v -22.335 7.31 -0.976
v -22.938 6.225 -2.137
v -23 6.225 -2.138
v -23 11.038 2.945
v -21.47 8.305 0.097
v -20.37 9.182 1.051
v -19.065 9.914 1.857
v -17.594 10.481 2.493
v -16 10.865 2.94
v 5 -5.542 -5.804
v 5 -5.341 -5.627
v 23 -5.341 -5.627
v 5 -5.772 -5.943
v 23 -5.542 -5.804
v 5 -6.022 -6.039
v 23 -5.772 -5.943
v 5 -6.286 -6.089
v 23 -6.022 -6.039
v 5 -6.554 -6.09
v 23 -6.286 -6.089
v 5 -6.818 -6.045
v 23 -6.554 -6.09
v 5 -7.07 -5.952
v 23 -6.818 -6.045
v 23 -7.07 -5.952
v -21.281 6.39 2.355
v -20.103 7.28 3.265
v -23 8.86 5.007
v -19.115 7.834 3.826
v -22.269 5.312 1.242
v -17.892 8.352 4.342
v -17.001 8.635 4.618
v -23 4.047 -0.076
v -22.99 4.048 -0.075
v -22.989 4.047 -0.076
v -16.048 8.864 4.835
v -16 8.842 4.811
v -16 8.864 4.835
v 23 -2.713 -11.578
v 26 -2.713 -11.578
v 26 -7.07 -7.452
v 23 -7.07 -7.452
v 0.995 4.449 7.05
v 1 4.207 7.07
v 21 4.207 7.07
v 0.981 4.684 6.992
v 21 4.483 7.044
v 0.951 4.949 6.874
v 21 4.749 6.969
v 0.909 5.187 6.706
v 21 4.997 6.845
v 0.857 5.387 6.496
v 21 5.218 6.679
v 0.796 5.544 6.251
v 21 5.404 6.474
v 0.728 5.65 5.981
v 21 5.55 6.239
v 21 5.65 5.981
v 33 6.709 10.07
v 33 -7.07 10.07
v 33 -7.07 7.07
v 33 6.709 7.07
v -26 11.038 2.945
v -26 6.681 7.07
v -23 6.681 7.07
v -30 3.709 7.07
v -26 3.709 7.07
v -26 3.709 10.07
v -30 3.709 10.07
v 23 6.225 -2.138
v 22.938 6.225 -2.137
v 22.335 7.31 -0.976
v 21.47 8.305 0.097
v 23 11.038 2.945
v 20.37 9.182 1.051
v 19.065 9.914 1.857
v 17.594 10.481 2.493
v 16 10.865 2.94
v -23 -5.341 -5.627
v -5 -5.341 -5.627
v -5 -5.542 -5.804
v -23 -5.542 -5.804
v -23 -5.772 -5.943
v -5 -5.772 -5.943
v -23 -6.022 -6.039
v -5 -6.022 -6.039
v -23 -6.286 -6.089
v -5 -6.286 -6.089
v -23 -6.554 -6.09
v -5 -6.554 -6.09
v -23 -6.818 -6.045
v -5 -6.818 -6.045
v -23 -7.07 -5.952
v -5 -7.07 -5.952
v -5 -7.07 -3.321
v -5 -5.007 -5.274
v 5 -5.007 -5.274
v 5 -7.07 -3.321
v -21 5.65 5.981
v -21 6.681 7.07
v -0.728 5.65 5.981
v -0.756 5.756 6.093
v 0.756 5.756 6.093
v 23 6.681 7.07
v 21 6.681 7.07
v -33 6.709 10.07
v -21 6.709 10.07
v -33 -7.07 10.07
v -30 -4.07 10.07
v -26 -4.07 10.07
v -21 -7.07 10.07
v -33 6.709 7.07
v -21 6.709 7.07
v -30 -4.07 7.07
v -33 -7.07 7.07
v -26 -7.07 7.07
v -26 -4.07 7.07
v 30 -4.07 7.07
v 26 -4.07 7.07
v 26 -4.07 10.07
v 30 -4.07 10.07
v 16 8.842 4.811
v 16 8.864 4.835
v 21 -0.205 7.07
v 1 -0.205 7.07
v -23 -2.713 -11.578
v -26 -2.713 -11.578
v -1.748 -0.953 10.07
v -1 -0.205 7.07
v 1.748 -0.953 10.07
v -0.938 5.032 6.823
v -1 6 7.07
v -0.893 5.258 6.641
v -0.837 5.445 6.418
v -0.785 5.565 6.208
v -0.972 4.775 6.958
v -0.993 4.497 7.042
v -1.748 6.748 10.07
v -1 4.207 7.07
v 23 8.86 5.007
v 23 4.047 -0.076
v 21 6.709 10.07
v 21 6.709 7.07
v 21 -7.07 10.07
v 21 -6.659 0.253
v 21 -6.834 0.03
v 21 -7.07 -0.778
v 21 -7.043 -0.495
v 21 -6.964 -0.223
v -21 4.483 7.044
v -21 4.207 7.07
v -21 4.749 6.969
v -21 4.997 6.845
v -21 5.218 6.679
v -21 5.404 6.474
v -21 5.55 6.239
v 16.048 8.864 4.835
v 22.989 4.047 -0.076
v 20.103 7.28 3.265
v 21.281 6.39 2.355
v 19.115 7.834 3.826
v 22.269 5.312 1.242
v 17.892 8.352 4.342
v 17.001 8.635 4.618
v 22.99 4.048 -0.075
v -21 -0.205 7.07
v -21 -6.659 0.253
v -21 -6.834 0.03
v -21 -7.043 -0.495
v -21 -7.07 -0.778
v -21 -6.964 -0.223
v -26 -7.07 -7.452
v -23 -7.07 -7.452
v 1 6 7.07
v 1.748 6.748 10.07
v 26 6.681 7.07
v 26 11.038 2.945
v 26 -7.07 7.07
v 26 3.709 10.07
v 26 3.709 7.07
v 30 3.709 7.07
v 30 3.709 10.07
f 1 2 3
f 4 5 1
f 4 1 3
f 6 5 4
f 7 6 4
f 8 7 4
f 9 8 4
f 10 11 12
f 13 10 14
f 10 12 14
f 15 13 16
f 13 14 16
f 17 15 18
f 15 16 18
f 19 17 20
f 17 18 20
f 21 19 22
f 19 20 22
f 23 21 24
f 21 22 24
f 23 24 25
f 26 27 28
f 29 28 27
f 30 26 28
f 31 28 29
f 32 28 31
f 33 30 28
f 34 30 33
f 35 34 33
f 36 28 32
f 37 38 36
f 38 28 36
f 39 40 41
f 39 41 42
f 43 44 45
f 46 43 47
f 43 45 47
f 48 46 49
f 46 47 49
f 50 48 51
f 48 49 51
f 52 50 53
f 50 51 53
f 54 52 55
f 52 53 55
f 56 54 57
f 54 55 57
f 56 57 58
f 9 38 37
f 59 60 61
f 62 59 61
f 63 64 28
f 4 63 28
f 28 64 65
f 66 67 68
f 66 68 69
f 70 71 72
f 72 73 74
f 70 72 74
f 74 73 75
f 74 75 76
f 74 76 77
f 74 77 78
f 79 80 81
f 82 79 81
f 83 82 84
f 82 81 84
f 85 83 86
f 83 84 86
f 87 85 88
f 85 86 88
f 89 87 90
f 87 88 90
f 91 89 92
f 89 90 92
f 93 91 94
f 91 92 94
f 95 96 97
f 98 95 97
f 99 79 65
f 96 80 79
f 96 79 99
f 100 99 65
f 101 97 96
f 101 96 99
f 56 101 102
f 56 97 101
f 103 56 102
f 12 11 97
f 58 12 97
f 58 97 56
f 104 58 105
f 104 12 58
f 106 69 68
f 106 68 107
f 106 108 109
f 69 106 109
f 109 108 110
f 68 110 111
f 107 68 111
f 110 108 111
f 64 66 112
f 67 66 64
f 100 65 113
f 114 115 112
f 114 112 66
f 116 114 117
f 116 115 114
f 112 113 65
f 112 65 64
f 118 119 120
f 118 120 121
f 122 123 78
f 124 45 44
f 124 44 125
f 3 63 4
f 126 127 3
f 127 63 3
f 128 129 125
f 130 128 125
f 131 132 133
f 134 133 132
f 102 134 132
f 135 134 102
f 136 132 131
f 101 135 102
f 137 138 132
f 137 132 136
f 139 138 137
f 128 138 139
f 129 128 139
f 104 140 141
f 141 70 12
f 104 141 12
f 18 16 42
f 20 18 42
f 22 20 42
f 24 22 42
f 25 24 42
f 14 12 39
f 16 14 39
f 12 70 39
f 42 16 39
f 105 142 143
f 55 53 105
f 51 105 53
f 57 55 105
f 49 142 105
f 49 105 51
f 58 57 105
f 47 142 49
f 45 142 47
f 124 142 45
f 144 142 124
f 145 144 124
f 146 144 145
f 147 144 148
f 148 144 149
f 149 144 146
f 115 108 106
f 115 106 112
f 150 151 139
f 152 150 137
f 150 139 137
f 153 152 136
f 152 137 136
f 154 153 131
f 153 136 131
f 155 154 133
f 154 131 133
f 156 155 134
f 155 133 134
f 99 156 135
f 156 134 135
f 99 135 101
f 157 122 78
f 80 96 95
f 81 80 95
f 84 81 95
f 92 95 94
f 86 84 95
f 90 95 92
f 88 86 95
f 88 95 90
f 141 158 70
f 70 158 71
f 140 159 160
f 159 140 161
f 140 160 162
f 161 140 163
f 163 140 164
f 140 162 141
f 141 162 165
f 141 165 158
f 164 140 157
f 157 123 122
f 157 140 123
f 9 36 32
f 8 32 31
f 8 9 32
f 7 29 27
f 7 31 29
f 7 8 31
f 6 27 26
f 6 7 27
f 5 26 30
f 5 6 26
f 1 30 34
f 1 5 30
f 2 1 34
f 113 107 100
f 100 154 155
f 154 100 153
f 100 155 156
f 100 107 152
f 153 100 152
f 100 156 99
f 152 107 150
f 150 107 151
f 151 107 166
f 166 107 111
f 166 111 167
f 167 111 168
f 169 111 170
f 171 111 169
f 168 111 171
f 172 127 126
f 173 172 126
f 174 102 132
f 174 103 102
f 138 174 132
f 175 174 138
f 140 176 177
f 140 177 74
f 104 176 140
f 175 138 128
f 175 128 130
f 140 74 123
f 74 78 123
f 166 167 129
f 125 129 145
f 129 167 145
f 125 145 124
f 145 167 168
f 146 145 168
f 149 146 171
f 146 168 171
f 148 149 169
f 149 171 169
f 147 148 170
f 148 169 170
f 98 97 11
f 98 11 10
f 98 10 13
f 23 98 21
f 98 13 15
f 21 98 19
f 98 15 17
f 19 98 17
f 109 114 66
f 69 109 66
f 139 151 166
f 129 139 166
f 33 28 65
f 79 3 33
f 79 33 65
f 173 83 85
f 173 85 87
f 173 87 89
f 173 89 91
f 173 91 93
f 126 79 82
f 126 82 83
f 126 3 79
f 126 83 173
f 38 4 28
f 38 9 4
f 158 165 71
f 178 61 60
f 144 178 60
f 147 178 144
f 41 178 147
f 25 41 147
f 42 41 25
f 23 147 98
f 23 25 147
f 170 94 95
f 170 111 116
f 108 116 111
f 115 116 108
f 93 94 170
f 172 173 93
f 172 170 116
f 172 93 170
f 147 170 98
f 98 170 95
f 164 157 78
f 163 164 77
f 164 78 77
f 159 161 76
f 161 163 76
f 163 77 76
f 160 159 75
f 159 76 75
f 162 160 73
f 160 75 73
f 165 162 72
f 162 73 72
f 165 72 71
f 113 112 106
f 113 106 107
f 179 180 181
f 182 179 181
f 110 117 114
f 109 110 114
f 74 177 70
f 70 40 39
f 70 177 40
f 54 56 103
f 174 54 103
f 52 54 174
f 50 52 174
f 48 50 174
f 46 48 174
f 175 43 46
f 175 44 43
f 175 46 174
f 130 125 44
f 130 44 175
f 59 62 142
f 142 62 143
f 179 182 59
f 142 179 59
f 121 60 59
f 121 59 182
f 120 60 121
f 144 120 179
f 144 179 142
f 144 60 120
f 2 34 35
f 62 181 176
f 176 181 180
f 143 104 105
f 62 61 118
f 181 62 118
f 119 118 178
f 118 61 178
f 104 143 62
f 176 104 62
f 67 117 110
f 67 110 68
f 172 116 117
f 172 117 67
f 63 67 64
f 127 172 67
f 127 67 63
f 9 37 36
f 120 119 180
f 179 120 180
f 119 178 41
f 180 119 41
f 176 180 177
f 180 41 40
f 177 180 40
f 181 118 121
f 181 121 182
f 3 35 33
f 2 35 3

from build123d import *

# Parameters (mm, degrees)
BOSS_EXTRUDE2_DEPTH     = 26
SHELL3_T                = -5
SKETCH2_W               = 3
SKETCH2_H               = 20
BOSS_EXTRUDE3_DEPTH     = 6
BOSS_EXTRUDE4_DEPTH     = 7
BOSS_EXTRUDE4_TAPER     = 1
BOSS_EXTRUDE5_START     = -7.07
BOSS_EXTRUDE5_OUTLINE_W = 12
BOSS_EXTRUDE5_OUTLINE_H = 3
BOSS_EXTRUDE5_DEPTH     = 13.778752476
SKETCH7_W               = 4
SKETCH7_H               = 7.778752476
CUT_EXTRUDE1_DEPTH      = 3
CUT_EXTRUDE5_DEPTH      = 3
SKETCH8_W               = 2
SKETCH8_H               = 6.204571956
BOSS_EXTRUDE6_DEPTH     = 3
BOSS_EXTRUDE6_DRAFT     = -14
SKETCH10_W              = 10
SKETCH10_H              = 3
CUT_EXTRUDE2_DEPTH      = 3
CHAMFER2_SIZE           = 1.5
CHAMFER2_SIZE_2         = 1.061054559
FILLET7_R               = 1.5


# Read off the part's stored shape, not the designer's step: Boss-Extrude5
with BuildPart() as part:
    # Sketch1 → Boss-Extrude2 (new, symmetric)
    with BuildSketch(Plane(origin=(0, 0, 0), x_dir=(0, 0, -1), z_dir=(1, 0, 0))):
        Polygon((-7.07, 6.681327836), (-7.07, -7.07), (7.452430332, -7.07), align=None)
    extrude(amount=BOSS_EXTRUDE2_DEPTH, both=True)

    # Shell3
    shell3_openings = [part.faces().sort_by_distance(p)[0] for p in [
        (0, -0.194336082, 7.07),
        (0, -7.07, -0.191215166),
    ]]
    offset(amount=SHELL3_T, openings=shell3_openings, kind=Kind.INTERSECTION)

    # Sketch2 → Boss-Extrude3 (add)
    with BuildSketch(Plane(origin=(0, -0.006998714, 0.006627101), x_dir=(1, 0, 0), z_dir=(0, 0.7261215165867746, -0.6875663918122543))):
        with Locations((-24.5, 0.272464405)):
            Rectangle(SKETCH2_W, SKETCH2_H)
    boss_extrude3 = extrude(amount=BOSS_EXTRUDE3_DEPTH)

    # Sketch3 → Boss-Extrude4 (add)
    with BuildSketch(Plane(origin=(-23, 0, 0), x_dir=(0, 0, -1), z_dir=(1, 0, 0))):
        Polygon((-5.007300825, 8.859692386), (0.075549792, 4.046727643), (2.138248967, 6.225092193), (-2.944601649, 11.038056936), align=None)
    boss_extrude4 = extrude(amount=BOSS_EXTRUDE4_DEPTH, taper=BOSS_EXTRUDE4_TAPER)

    # Boss-Extrude5 outline → Boss-Extrude5 (add)
    with BuildSketch(Plane(origin=(0, 0, 0), x_dir=(1, 0, 0), z_dir=(0, 1, 0)).offset(BOSS_EXTRUDE5_START)):
        with Locations((-27, -8.57)):
            Rectangle(BOSS_EXTRUDE5_OUTLINE_W, BOSS_EXTRUDE5_OUTLINE_H)
    boss_extrude5 = extrude(amount=BOSS_EXTRUDE5_DEPTH)

    # Sketch7 → Cut-Extrude1 (cut)
    with BuildSketch(Plane(origin=(0, 0, 7.07), x_dir=(-1, 0, 0), z_dir=(0, 0, -1))):
        with Locations((28, -0.180623762)):
            Rectangle(SKETCH7_W, SKETCH7_H)
    cut_extrude1 = extrude(amount=-CUT_EXTRUDE1_DEPTH, mode=Mode.SUBTRACT)

    # Sketch11 → Cut-Extrude5 (cut)
    with BuildSketch(Plane(origin=(0.097524812, 4.056980848, -3.841565936), x_dir=(0.9998476951563913, -0.012672567830329124, 0.011999688122524015), z_dir=(0.017452406437283557, 0.72601092476275, -0.6874616721204788))):
        with BuildLine():
            ThreePointArc((-16.099976916, -9.605350141), (-20.470201884, -7.075920319), (-23.038834329, -2.72862129))
            add(Edge.make_bspline(
                [(-23.038834329, -2.72862129), (-20.964785252, -1.12213519), (-16.845095332, -0.866613762), (-13.311050846, -5.432002143), (-14.677947992, -8.654526842), (-16.099976916, -9.605350141)],
                knots=[0, 0, 0, 0, 0.462245197, 0.666716807, 1, 1, 1, 1], degree=3))
        make_face()
    cut_extrude5 = extrude(amount=-CUT_EXTRUDE5_DEPTH, mode=Mode.SUBTRACT)

    # Mirror4: Boss-Extrude3, Boss-Extrude4, Boss-Extrude5, Cut-Extrude1, Cut-Extrude5 across plane
    add(boss_extrude3.mirror(Plane(origin=(0, 0, 0), x_dir=(0, 0, 1), z_dir=(1, 0, 0))))
    add(boss_extrude4.mirror(Plane(origin=(0, 0, 0), x_dir=(0, 0, 1), z_dir=(1, 0, 0))))
    add(boss_extrude5.mirror(Plane(origin=(0, 0, 0), x_dir=(0, 0, 1), z_dir=(1, 0, 0))))
    add(cut_extrude1.mirror(Plane(origin=(0, 0, 0), x_dir=(0, 0, 1), z_dir=(1, 0, 0))), mode=Mode.SUBTRACT)
    add(cut_extrude5.mirror(Plane(origin=(0, 0, 0), x_dir=(0, 0, 1), z_dir=(1, 0, 0))), mode=Mode.SUBTRACT)


with BuildPart() as boss_extrude6_tool:
    # Sketch8 → Boss-Extrude6 (with draft: the straight prism first)
    with BuildSketch(Plane.XY.offset(7.07)):
        with Locations((0, 2.897714022)):
            Rectangle(SKETCH8_W, SKETCH8_H)
    extrude(amount=BOSS_EXTRUDE6_DEPTH)
    # Boss-Extrude6: the draft: its side faces are tilted about the plane it starts from
    boss_extrude6_sides = [boss_extrude6_tool.faces().sort_by_distance(p)[0] for p in [
        (0, -0.204571956, 8.57),
        (1, 2.897714022, 8.57),
        (0, 6, 8.57),
        (-1, 2.897714022, 8.57),
    ]]
    draft(boss_extrude6_sides, Plane.XY.offset(7.07), BOSS_EXTRUDE6_DRAFT)


with BuildPart() as part_1:
    add(part.part)

    # Boss-Extrude6: add boss_extrude6_tool
    add(boss_extrude6_tool.part)

    # Sketch10 → Cut-Extrude2 (cut)
    with BuildSketch(Plane(origin=(0, -0.006998714, 0.006627101), x_dir=(1, 0, 0), z_dir=(0, 0.7261215165867746, -0.6875663918122543))):
        with Locations((0, 8.772464405)):
            Rectangle(SKETCH10_W, SKETCH10_H)
    extrude(amount=-CUT_EXTRUDE2_DEPTH, mode=Mode.SUBTRACT)

    # Chamfer2
    # the kernel refuses this chamfer: 1.5, 1.061054559 mm, written as the material it takes off along each edge
    with BuildSketch(Plane(origin=(21, 6.681327836, 7.07), x_dir=(0, -0.6673410869627874, -0.7447522229918655), z_dir=(-1, 0, 0))) as chamfer2_piece_1_section:
        Polygon((CHAMFER2_SIZE * 0.999621916911, CHAMFER2_SIZE * 0.0274958766106), (CHAMFER2_SIZE_2 * 0.667341086869, CHAMFER2_SIZE_2 * 0.744752222888), (0, 0), align=None)
    chamfer2_piece_1 = extrude(amount=45.857524482, mode=Mode.PRIVATE)
    chamfer2_piece_1 = split(chamfer2_piece_1, bisect_by=Plane(origin=(1.484835195, 5.763736447, 9.014567757), z_dir=(0.9702957262759965, 0, -0.24192189559966784)), keep=Keep.TOP, mode=Mode.PRIVATE)
    add(chamfer2_piece_1, mode=Mode.SUBTRACT)
    with BuildSketch(Plane(origin=(24.857524482, 6.681327836, 7.07), x_dir=(0, -0.6673410869627874, -0.7447522229918655), z_dir=(-1, 0, 0))) as chamfer2_piece_2_section:
        Polygon((CHAMFER2_SIZE * 0.999621916911, CHAMFER2_SIZE * 0.0274958766106), (CHAMFER2_SIZE_2 * 0.667341086869, CHAMFER2_SIZE_2 * 0.744752222888), (0, 0), align=None)
    chamfer2_piece_2 = extrude(amount=45.857524482, mode=Mode.PRIVATE)
    chamfer2_piece_2 = split(chamfer2_piece_2, bisect_by=Plane(origin=(-1.484835195, 5.763736447, 9.014567757), z_dir=(-0.9702957262759965, 0, -0.24192189559966784)), keep=Keep.TOP, mode=Mode.PRIVATE)
    add(chamfer2_piece_2, mode=Mode.SUBTRACT)
    with BuildSketch(Plane(origin=(24.857524482, 6.681327836, 7.07), x_dir=(0, -0.6673410869627874, -0.7447522229918655), z_dir=(-1, 0, 0))) as chamfer2_piece_3_section:
        Polygon((CHAMFER2_SIZE * 0.999621916911, CHAMFER2_SIZE * 0.0274958766106), (CHAMFER2_SIZE_2 * 0.667341086869, CHAMFER2_SIZE_2 * 0.744752222888), (0, 0), align=None)
    chamfer2_piece_3 = extrude(amount=49.715048964, mode=Mode.PRIVATE)
    chamfer2_piece_3 = split(chamfer2_piece_3, bisect_by=Plane(origin=(0.868426691, 6.154537231, 6.542288281), z_dir=(-0.9702957262759965, 0, 0.24192189559966784)), keep=Keep.TOP, mode=Mode.PRIVATE)
    chamfer2_piece_3 = split(chamfer2_piece_3, bisect_by=Plane(origin=(0, 5.935997372, 6.81329948), z_dir=(0, 0.9702957262759965, -0.24192189559966784)), keep=Keep.TOP, mode=Mode.PRIVATE)
    chamfer2_piece_3 = split(chamfer2_piece_3, bisect_by=Plane(origin=(-0.868426691, 6.154537231, 6.542288281), z_dir=(0.9702957262759965, 0, 0.24192189559966784)), keep=Keep.TOP, mode=Mode.PRIVATE)
    add(chamfer2_piece_3, mode=Mode.SUBTRACT)
    with BuildSketch(Plane(origin=(23, -7.07, -7.452430332), x_dir=(0, 0.7275099269437866, 0.6860971550722583), z_dir=(-1, 0, 0)), Plane(origin=(-1.142475518, -7.07, -7.452430332), x_dir=(0, 0.7275099269437866, 0.6860971550722583), z_dir=(-1, 0, 0))) as chamfer2_piece_4:
        Polygon((CHAMFER2_SIZE_2 * 0.998401282104, -CHAMFER2_SIZE_2 * 0.0565232661308), (CHAMFER2_SIZE * 0.686097155072, -CHAMFER2_SIZE * 0.727509926944), (0, 0), align=None)
    extrude(amount=21.857524482, mode=Mode.SUBTRACT)

    # Fillet7
    # the kernel refuses this fillet: 1.5 mm, written as the material it takes off along each edge
    with BuildSketch(Plane(origin=(21, 5.620273277, 7.07), x_dir=(0, 0.02726259017777431, -0.9996283065103743), z_dir=(-1, 0, 0))) as fillet7_piece_1_section:
        with BuildLine():
            CenterArc((1.460922015, 1.453310189), FILLET7_R, 181.562224917, 74.10480975)
            Line((-0.038520445, 1.412416304), (-0.068509294, 1.411598426))
            Line((-0.068509294, 1.411598426), (-0.029988849, -0.000817878))
            Line((-0.029988849, -0.000817878), (0, -0.03))
            ThreePointArc((0, -0.03), (0.544793634, -0.03), (1.082160572, -0.029066204))
            Line((1.082160572, -0.029066204), (1.089587267, 0))
        make_face()
    fillet7_piece_1 = extrude(amount=23.532353712, mode=Mode.PRIVATE)
    fillet7_piece_1 = split(fillet7_piece_1, bisect_by=Plane(origin=(1.518643203, 5.295979724, 9.15016427), z_dir=(0.9702957262759188, 0, -0.24192189559997973)), keep=Keep.TOP, mode=Mode.PRIVATE)
    add(fillet7_piece_1, mode=Mode.SUBTRACT)
    with BuildSketch(Plane(origin=(21, 5.620273277, 7.07), x_dir=(0, 0.02726259017777431, -0.9996283065103743), z_dir=(-1, 0, 0))) as fillet7_piece_2_section:
        with BuildLine():
            CenterArc((1.460922015, 1.453310189), FILLET7_R, 181.562224917, 74.10480975)
            Line((-0.038520445, 1.412416304), (-0.068509294, 1.411598426))
            Line((-0.068509294, 1.411598426), (-0.029988849, -0.000817878))
            Line((-0.029988849, -0.000817878), (0, -0.03))
            ThreePointArc((0, -0.03), (0.544793634, -0.03), (1.082160572, -0.029066204))
            Line((1.082160572, -0.029066204), (1.089587267, 0))
        make_face()
    fillet7_piece_2 = extrude(amount=23.532353712, mode=Mode.PRIVATE)
    fillet7_piece_2 = split(fillet7_piece_2, bisect_by=Plane(origin=(-0.975981109, 5.302873869, 6.97366549), z_dir=(-0.9702957262759188, 0, -0.24192189559997973)), keep=Keep.TOP, mode=Mode.PRIVATE)
    add(fillet7_piece_2, mode=Mode.SUBTRACT)
    with BuildSketch(Plane(origin=(2.532353712, 5.620273277, 7.07), x_dir=(0, 0.02726259017777401, -0.9996283065103743), z_dir=(-1, 0, 0))) as fillet7_piece_3_section:
        with BuildLine():
            CenterArc((1.460922015, 1.453310189), FILLET7_R, 181.562224917, 74.10480975)
            Line((-0.038520445, 1.412416304), (-0.068509294, 1.411598426))
            Line((-0.068509294, 1.411598426), (-0.029988849, -0.000817878))
            Line((-0.029988849, -0.000817878), (0, -0.03))
            ThreePointArc((0, -0.03), (0.544793634, -0.03), (1.082160572, -0.029066204))
            Line((1.082160572, -0.029066204), (1.089587267, 0))
        make_face()
    fillet7_piece_3 = extrude(amount=23.532353712, mode=Mode.PRIVATE)
    fillet7_piece_3 = split(fillet7_piece_3, bisect_by=Plane(origin=(0.975981109, 5.302873869, 6.97366549), z_dir=(0.9702957262759188, 0, -0.24192189559997973)), keep=Keep.TOP, mode=Mode.PRIVATE)
    add(fillet7_piece_3, mode=Mode.SUBTRACT)
    with BuildSketch(Plane(origin=(2.532353712, 5.620273277, 7.07), x_dir=(0, 0.02726259017777401, -0.9996283065103743), z_dir=(-1, 0, 0))) as fillet7_piece_4_section:
        with BuildLine():
            CenterArc((1.460922015, 1.453310189), FILLET7_R, 181.562224917, 74.10480975)
            Line((-0.038520445, 1.412416304), (-0.068509294, 1.411598426))
            Line((-0.068509294, 1.411598426), (-0.029988849, -0.000817878))
            Line((-0.029988849, -0.000817878), (0, -0.03))
            ThreePointArc((0, -0.03), (0.544793634, -0.03), (1.082160572, -0.029066204))
            Line((1.082160572, -0.029066204), (1.089587267, 0))
        make_face()
    fillet7_piece_4 = extrude(amount=23.532353712, mode=Mode.PRIVATE)
    fillet7_piece_4 = split(fillet7_piece_4, bisect_by=Plane(origin=(-1.518643203, 5.295979724, 9.15016427), z_dir=(-0.9702957262759188, 0, -0.24192189559997973)), keep=Keep.TOP, mode=Mode.PRIVATE)
    add(fillet7_piece_4, mode=Mode.SUBTRACT)
    with BuildSketch(Plane(origin=(-21, -7.07, -0.180405318), x_dir=(0, 0, -1), z_dir=(1, 0, 0))) as fillet7_piece_5:
        with BuildLine():
            CenterArc((FILLET7_R * 0.398330236432, FILLET7_R), FILLET7_R, 226.562224917, 43.437775083)
            Line((-FILLET7_R * 0.28923615538, FILLET7_R * 0.273878483413), (-FILLET7_R * 0.302987483217, FILLET7_R * 0.259356053081))
            Line((-FILLET7_R * 0.302987483217, FILLET7_R * 0.259356053081), (-FILLET7_R * 0.00796660472864, -FILLET7_R * 0.02))
            Line((-FILLET7_R * 0.00796660472864, -FILLET7_R * 0.02), (FILLET7_R * 0.398330236432, -FILLET7_R * 0.02))
            Line((FILLET7_R * 0.398330236432, -FILLET7_R * 0.02), (FILLET7_R * 0.398330236432, 0))
        make_face()
    extrude(amount=42, mode=Mode.SUBTRACT)
    with BuildSketch(Plane(origin=(23, -6.340454545, -6.681975786), x_dir=(0, 0.6875663918122538, 0.7261215165867753), z_dir=(-1, 0, 0)), Plane(origin=(-1.367407216, -6.340454545, -6.681975786), x_dir=(0, 0.6875663918122543, 0.7261215165867746), z_dir=(-1, 0, 0))) as fillet7_piece_6:
        with BuildLine():
            CenterArc((1.453037114, -1.5), FILLET7_R, 90, 71.794047616)
            Line((0.028127716, -1.031349588), (-0.000370472, -1.021976579))
            ThreePointArc((-0.000370472, -1.021976579), (-0.015924991, -0.516492672), (-0.029988849, -0.000817878))
            Line((-0.029988849, -0.000817878), (0, 0.03))
            Line((0, 0.03), (1.453037114, 0.03))
            Line((1.453037114, 0.03), (1.453037114, 0))
        make_face()
    extrude(amount=21.632592784, mode=Mode.SUBTRACT)


solid = part_1.part
